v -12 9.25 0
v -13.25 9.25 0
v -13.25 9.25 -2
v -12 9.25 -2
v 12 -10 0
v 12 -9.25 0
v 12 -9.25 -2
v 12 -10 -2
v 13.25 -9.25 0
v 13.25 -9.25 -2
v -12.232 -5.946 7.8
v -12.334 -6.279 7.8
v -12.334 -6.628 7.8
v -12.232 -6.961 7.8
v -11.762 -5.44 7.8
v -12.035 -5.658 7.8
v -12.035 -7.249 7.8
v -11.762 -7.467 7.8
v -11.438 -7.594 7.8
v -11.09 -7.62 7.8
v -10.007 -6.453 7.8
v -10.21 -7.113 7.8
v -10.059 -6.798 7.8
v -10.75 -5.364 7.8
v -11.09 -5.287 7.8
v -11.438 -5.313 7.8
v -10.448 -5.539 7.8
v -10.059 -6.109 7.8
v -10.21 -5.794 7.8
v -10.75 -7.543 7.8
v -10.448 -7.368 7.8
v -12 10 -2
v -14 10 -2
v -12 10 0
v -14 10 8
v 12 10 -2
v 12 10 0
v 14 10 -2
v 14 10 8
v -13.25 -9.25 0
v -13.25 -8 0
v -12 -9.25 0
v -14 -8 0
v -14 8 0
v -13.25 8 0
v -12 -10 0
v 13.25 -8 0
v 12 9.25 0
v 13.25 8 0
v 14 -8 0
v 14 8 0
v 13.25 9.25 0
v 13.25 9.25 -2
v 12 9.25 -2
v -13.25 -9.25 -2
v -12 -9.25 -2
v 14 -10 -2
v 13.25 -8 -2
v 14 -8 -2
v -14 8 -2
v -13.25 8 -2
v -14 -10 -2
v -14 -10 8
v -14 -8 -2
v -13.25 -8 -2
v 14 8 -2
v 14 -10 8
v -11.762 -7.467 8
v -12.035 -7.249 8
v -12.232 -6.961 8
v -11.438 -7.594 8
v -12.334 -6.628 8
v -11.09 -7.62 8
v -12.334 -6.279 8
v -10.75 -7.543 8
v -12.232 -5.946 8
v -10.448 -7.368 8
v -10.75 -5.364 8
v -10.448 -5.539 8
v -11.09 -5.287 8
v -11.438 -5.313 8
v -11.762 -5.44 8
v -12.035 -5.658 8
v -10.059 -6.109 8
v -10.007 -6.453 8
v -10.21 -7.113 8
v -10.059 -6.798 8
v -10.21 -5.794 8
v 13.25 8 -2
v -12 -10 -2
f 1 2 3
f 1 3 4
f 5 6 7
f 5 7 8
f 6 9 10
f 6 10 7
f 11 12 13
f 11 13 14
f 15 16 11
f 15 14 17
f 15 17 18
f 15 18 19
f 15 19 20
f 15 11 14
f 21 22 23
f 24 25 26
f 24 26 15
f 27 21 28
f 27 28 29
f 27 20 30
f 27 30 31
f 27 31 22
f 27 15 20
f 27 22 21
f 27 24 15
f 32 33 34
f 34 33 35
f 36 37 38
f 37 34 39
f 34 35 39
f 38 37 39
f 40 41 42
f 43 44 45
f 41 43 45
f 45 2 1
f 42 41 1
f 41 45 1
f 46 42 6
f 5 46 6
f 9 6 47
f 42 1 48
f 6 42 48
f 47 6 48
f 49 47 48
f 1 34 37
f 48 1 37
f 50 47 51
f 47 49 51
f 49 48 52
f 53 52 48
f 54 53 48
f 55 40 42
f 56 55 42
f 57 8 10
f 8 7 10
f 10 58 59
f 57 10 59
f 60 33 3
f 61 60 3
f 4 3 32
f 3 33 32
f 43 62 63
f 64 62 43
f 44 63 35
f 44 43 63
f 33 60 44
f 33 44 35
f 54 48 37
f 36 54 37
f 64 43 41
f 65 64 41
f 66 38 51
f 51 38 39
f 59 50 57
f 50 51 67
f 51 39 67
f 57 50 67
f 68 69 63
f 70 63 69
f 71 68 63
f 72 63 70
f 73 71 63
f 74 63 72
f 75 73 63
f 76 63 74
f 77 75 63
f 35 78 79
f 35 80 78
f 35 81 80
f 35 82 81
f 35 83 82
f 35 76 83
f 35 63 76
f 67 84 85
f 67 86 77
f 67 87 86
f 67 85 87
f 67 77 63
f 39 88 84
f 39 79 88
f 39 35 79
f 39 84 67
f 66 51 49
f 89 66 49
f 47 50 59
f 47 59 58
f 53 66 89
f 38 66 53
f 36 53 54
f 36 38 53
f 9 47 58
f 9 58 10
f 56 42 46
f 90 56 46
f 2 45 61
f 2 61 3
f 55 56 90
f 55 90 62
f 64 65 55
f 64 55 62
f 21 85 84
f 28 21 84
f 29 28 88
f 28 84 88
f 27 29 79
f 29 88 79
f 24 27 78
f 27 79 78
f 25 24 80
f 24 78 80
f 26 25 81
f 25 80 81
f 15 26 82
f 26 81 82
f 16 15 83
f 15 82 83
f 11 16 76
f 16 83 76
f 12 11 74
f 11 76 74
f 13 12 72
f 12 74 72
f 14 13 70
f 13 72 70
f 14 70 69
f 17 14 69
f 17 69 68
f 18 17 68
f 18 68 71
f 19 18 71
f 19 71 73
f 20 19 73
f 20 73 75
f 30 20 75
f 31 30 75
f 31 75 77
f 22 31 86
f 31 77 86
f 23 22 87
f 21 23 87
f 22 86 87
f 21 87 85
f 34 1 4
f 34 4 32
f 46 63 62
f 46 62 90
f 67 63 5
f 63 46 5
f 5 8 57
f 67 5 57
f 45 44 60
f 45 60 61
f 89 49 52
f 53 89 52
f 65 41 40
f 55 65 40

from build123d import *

# Parameters (mm, degrees)
SKETCH_1_W          = 28
SKETCH_1_H          = 20
EXTRUDE_1_DEPTH     = 8
EXTRUDE_2_DEPTH     = 2
SKETCH_3_R          = 1.170120389
CUT_EXTRUDE_1_DEPTH = 0.2


with BuildPart() as part:
    # 草图1 → 拉伸1 (new body)
    with BuildSketch(Plane.XY):
        Rectangle(SKETCH_1_W, SKETCH_1_H)
    extrude(amount=EXTRUDE_1_DEPTH)

    # 草图2 → 拉伸2 (add)
    with BuildSketch(Plane(origin=(0, 0, 0), x_dir=(-1, 0, 0), z_dir=(0, 0, -1))):
        Polygon((-14, 10), (-14, 8), (-13.25, 8), (-13.25, 9.25), (-12, 9.25), (-12, 10), align=None)
        Polygon((12, 10), (14, 10), (14, 8), (13.25, 8), (13.25, 9.25), (12, 9.25), align=None)
        Polygon((-12, -10), (-14, -10), (-14, -8), (-13.25, -8), (-13.25, -9.25), (-12, -9.25), align=None)
        Polygon((14, -10), (14, -8), (13.25, -8), (13.25, -9.25), (12, -9.25), (12, -10), align=None)
    extrude(amount=EXTRUDE_2_DEPTH)

    # 草图3 → 切除-拉伸1 (cut)
    with BuildSketch(Plane.XY.offset(8)):
        with Locations((-11.177269576, -6.453473504)):
            Circle(SKETCH_3_R)
    extrude(amount=-CUT_EXTRUDE_1_DEPTH, mode=Mode.SUBTRACT)


solid = part.part
